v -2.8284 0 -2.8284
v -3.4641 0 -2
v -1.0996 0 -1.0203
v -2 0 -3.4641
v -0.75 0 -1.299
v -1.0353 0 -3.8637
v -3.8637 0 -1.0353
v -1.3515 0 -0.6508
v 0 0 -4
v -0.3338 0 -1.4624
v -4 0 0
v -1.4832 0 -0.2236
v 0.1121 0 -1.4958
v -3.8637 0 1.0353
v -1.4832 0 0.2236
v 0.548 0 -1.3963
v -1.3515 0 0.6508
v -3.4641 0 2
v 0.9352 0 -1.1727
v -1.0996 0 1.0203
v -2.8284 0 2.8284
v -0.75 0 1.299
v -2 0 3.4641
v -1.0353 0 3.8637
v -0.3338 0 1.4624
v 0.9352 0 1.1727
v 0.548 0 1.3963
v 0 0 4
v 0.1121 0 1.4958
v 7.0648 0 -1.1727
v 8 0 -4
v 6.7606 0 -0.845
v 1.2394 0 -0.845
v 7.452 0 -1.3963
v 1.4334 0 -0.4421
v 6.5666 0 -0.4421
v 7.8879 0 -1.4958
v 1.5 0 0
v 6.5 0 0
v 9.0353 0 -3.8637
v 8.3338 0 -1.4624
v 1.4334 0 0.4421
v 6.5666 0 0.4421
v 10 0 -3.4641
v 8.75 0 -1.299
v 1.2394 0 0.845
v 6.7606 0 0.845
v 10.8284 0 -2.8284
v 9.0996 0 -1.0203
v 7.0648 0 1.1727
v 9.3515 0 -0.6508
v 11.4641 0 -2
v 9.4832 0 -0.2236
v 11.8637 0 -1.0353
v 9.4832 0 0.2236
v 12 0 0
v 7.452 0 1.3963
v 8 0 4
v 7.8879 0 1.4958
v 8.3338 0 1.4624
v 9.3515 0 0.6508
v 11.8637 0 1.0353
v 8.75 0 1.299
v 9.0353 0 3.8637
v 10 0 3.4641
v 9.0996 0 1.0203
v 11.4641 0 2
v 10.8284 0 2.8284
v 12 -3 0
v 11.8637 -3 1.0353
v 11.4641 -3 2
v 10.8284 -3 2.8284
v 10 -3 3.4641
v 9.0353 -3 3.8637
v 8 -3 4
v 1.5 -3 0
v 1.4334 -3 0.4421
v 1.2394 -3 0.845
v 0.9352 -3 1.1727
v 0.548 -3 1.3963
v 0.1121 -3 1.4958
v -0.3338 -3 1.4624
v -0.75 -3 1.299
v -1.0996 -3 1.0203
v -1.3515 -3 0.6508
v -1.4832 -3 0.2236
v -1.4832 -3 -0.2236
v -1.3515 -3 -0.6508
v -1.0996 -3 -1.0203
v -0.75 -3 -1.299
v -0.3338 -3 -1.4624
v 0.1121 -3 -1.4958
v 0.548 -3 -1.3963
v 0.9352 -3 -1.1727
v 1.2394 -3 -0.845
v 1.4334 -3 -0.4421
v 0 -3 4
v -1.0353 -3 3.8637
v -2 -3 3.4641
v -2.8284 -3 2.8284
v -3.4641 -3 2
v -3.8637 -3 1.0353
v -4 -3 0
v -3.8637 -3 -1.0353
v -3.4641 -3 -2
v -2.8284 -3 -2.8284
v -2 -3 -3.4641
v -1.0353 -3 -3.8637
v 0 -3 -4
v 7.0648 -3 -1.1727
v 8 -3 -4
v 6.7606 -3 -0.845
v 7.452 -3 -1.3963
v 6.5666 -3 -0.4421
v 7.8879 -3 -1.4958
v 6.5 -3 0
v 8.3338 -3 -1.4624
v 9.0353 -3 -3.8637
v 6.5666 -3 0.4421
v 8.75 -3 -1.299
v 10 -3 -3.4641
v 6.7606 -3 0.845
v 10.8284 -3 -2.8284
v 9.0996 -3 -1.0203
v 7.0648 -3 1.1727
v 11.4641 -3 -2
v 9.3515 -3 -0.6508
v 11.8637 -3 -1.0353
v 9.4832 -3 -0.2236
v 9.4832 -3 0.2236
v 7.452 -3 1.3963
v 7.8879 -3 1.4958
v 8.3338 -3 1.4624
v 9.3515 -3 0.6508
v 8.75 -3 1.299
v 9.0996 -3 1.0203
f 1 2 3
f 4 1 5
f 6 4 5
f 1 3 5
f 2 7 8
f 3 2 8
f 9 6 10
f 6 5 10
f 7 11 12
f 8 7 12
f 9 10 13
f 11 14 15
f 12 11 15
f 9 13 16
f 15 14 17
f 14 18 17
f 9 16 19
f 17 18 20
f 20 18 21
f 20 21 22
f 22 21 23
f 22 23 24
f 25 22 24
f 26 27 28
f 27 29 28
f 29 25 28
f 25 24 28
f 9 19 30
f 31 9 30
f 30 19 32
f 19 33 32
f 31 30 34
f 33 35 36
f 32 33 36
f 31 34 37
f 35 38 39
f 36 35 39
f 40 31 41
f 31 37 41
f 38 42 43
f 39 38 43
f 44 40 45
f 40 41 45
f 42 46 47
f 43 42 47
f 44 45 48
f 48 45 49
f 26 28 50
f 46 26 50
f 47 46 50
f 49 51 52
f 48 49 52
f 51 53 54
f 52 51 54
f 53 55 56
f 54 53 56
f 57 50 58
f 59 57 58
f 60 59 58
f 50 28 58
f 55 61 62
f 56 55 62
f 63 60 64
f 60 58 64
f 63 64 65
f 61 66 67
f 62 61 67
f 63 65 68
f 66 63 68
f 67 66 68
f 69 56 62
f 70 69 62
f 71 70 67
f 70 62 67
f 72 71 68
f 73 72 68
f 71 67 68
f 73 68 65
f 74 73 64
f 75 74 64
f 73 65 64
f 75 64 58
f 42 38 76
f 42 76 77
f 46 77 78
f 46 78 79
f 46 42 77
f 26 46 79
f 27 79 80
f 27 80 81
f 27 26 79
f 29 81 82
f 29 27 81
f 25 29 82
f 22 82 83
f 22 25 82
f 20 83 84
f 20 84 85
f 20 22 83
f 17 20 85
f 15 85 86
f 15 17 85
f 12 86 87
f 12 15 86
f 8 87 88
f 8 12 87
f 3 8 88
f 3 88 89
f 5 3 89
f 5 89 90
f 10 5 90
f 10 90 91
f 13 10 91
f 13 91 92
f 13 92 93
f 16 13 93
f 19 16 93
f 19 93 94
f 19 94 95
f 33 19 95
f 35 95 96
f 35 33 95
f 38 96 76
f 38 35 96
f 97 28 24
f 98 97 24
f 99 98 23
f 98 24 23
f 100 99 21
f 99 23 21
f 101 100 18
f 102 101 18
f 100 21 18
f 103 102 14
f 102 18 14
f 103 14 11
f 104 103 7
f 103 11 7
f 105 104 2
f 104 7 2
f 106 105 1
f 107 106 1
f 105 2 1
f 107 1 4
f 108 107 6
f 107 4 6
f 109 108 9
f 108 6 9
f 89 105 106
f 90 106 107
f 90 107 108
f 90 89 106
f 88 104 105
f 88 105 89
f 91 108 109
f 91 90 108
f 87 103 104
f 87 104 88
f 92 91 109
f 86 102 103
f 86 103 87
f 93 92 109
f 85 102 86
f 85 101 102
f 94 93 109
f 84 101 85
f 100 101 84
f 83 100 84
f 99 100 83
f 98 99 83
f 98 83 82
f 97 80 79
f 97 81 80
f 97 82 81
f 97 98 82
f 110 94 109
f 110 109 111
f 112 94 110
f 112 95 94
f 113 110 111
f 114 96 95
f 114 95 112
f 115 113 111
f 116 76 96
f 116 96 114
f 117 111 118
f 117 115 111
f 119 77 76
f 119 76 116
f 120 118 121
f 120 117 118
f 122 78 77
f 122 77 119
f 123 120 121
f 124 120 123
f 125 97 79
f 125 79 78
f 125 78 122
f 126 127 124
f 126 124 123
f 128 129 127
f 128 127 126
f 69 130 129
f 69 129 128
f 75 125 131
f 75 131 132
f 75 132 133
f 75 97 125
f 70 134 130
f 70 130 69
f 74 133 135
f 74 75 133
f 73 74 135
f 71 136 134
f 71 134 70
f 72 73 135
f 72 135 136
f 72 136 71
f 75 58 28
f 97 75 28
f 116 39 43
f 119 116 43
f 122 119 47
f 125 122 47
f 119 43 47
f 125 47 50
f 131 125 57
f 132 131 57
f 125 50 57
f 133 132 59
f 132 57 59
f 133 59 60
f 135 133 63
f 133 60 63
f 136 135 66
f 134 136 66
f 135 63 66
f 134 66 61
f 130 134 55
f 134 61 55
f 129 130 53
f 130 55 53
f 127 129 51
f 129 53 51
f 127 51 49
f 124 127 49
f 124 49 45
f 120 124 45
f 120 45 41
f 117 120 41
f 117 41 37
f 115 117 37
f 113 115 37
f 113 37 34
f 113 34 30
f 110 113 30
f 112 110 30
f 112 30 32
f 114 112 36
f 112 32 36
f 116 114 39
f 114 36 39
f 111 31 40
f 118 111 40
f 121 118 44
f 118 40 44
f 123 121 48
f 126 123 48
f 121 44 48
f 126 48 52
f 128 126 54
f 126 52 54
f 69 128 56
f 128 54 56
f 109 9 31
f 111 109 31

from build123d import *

# Parameters (mm, degrees)
F0_R     = 1.5
F1_DEPTH = 3


with BuildPart() as f1:
    # F0 (on Front) → F1 (new body)
    with BuildSketch(Plane.XZ):
        Circle(F0_R)
        with BuildLine():
            ThreePointArc((0, -4), (2.828427, -2.828427), (4, 0))
            ThreePointArc((4, 0), (2.828427, 2.828427), (0, 4))
            ThreePointArc((0, 4), (-4, 0), (0, -4))
        make_face()
        Circle(F0_R, mode=Mode.SUBTRACT)
        with BuildLine():
            ThreePointArc((0, 4), (2.828427, 2.828427), (4, 0))
            ThreePointArc((4, 0), (5.171573, 2.828427), (8, 4))
            Line((8, 4), (0, 4))
        make_face()
        with BuildLine():
            ThreePointArc((9.5, 0), (8, 1.5), (6.5, 0))
            ThreePointArc((6.5, 0), (8, -1.5), (9.5, 0))
        make_face()
        with BuildLine():
            ThreePointArc((8, 4), (5.171573, 2.828427), (4, 0))
            ThreePointArc((4, 0), (5.171573, -2.828427), (8, -4))
            ThreePointArc((8, -4), (10.828427, -2.828427), (12, 0))
            ThreePointArc((12, 0), (10.828427, 2.828427), (8, 4))
        make_face()
        with BuildLine():
            ThreePointArc((9.5, 0), (8, -1.5), (6.5, 0))
            ThreePointArc((6.5, 0), (8, 1.5), (9.5, 0))
        make_face(mode=Mode.SUBTRACT)
        with BuildLine():
            ThreePointArc((8, -4), (5.171573, -2.828427), (4, 0))
            ThreePointArc((4, 0), (2.828427, -2.828427), (0, -4))
            Line((0, -4), (8, -4))
        make_face()
    extrude(amount=F1_DEPTH)


solid = f1.part
